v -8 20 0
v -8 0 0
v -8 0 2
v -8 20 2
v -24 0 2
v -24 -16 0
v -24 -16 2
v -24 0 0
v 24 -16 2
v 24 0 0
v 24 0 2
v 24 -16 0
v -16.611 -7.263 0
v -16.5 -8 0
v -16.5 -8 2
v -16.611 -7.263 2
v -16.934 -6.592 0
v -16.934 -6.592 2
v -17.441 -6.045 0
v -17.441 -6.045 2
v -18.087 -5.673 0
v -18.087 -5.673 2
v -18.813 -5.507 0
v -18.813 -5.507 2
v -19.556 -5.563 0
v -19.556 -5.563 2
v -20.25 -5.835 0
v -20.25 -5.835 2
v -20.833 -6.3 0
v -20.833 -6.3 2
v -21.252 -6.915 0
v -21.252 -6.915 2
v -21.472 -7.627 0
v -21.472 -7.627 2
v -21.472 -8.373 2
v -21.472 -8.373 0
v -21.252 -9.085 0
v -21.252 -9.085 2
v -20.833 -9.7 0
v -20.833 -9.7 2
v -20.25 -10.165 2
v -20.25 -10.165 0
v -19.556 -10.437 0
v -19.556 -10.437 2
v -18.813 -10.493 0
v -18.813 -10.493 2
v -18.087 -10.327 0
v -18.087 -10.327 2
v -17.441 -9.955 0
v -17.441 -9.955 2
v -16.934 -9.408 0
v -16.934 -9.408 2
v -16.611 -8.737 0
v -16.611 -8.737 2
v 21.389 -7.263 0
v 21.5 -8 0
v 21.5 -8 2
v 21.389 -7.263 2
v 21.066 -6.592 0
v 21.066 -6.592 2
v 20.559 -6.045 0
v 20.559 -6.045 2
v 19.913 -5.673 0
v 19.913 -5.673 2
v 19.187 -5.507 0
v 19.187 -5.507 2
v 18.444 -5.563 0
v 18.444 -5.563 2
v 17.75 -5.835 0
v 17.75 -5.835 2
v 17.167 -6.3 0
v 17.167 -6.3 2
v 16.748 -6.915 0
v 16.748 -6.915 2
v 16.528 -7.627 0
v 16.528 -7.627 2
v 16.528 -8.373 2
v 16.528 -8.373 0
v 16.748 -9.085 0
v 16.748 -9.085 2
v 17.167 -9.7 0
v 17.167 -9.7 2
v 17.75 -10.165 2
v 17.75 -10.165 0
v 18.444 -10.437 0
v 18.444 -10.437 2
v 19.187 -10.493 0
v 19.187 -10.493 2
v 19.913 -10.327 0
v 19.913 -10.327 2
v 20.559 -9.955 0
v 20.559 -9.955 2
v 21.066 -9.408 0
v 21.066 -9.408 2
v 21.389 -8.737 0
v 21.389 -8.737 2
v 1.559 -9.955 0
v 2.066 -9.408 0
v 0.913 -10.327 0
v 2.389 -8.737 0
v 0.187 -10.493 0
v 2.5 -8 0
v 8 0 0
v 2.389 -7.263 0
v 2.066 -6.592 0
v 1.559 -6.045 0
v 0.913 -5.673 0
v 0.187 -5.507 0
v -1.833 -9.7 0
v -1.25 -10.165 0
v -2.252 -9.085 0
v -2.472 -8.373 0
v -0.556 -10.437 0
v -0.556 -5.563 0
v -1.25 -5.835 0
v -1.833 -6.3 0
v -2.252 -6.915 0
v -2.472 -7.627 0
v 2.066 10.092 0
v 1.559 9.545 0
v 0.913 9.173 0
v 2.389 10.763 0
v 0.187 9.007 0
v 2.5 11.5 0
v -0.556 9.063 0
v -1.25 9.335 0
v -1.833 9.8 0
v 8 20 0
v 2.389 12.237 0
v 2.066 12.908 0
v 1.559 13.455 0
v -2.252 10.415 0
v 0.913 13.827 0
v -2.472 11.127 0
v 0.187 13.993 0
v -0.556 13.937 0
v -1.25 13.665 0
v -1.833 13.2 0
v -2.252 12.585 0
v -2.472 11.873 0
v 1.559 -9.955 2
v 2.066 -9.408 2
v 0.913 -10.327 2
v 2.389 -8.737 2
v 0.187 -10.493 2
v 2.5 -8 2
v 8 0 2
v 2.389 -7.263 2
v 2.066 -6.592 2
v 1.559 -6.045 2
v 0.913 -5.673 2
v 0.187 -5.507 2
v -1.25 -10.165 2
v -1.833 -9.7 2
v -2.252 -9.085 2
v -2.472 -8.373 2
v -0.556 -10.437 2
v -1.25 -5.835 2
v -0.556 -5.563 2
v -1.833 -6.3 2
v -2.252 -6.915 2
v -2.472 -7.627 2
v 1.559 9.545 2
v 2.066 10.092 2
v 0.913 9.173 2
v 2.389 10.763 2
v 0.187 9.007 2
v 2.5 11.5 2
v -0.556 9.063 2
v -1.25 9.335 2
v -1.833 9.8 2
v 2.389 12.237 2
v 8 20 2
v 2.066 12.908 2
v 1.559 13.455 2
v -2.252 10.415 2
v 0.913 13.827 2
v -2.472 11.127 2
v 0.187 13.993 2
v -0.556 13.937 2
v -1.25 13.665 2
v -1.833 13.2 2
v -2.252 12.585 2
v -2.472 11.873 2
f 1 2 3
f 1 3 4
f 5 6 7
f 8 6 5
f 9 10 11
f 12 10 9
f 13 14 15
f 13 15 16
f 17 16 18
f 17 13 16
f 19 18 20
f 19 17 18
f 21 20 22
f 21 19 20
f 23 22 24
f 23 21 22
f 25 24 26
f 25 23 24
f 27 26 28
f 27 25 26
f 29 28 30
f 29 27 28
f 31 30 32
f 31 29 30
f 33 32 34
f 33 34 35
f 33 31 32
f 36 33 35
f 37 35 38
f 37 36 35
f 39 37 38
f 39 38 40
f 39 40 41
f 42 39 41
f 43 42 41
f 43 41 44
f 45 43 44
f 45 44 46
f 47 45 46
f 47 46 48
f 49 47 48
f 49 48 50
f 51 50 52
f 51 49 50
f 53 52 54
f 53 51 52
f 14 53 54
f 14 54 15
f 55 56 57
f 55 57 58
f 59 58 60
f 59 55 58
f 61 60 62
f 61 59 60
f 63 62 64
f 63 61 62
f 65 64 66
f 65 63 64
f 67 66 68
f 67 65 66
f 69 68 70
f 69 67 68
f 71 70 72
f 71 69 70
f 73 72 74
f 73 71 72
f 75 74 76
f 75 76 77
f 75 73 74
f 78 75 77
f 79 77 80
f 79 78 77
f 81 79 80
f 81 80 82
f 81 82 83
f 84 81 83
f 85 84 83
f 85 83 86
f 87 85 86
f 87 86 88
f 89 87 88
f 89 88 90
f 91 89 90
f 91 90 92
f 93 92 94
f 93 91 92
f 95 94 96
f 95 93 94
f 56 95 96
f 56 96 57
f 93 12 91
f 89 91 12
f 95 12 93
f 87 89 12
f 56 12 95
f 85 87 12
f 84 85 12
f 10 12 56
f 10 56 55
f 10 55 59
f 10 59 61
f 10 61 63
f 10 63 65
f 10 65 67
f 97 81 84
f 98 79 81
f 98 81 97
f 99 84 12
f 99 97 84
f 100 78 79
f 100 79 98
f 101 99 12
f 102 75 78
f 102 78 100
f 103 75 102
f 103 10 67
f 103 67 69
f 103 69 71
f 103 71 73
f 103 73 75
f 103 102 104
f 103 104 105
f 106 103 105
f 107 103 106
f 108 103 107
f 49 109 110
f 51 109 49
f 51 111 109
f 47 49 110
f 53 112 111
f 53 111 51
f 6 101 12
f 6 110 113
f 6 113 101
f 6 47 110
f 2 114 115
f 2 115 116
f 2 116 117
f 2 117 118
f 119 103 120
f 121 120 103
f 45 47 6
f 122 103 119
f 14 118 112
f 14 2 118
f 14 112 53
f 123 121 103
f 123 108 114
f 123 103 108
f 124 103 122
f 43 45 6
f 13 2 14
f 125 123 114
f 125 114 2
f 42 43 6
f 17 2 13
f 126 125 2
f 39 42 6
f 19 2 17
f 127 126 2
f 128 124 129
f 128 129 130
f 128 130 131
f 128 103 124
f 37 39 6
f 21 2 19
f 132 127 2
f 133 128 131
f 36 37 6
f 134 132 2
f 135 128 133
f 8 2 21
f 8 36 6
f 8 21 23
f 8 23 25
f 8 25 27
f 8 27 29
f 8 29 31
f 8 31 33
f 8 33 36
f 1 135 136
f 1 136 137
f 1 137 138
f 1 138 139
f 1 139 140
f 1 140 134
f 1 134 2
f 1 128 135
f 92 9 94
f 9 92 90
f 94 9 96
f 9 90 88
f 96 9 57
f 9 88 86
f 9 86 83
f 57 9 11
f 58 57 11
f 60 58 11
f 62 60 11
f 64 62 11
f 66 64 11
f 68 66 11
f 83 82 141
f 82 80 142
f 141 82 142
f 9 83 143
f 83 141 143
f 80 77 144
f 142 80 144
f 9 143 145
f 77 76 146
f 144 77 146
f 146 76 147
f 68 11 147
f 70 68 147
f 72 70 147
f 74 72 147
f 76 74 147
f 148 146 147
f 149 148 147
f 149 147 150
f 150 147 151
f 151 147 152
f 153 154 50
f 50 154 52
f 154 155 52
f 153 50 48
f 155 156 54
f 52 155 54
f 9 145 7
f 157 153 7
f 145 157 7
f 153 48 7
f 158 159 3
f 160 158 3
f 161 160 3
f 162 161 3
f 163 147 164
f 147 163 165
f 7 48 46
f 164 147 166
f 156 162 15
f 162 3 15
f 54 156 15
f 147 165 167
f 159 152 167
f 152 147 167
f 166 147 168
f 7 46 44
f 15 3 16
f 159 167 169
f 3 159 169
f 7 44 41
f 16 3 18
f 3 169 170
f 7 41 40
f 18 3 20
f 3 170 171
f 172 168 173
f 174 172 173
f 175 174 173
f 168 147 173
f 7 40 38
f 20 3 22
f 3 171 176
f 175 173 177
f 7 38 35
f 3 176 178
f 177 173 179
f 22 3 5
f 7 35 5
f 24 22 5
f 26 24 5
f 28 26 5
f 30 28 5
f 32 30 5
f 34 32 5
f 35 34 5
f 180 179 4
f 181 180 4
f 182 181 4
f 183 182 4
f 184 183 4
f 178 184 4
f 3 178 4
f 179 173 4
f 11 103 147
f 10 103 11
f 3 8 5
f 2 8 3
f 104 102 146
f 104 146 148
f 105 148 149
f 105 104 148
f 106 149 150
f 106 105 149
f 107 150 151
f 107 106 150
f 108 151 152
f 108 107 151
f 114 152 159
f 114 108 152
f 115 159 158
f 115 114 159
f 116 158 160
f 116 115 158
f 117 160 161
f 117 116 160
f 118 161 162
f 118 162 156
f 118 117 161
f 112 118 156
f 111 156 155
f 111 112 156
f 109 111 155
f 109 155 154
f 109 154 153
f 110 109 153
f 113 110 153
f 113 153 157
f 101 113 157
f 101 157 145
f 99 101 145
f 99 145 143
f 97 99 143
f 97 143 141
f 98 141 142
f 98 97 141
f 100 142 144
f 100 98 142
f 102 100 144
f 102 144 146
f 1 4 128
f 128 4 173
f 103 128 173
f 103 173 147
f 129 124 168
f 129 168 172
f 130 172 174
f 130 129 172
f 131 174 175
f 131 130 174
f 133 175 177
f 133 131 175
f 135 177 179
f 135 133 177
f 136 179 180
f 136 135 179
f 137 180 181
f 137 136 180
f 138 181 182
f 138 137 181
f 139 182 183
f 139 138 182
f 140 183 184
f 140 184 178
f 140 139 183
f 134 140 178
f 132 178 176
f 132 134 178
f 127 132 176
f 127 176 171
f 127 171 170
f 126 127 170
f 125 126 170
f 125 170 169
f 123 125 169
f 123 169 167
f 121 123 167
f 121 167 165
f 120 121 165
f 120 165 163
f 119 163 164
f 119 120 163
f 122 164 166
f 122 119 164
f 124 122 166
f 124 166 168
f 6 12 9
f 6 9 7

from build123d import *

# Parameters (mm, degrees)
SKETCH2_R           = 2.5
EXTRUDE1_DEPTH      = 2
SKETCH_1_W          = 16
SKETCH_1_H          = 34
CUT_EXTRUDE_1_DEPTH = 60.126981996


with BuildPart() as part:
    # Sketch2 → Extrude1 (new body)
    with BuildSketch(Plane.XY):
        Polygon((-8, 0), (-8, 54), (8, 54), (8, 0), (24, 0), (24, -16), (-24, -16), (-24, 0), align=None)
        with Locations((19, -8)):
            Circle(SKETCH2_R, mode=Mode.SUBTRACT)
        with Locations((0, -8)):
            Circle(SKETCH2_R, mode=Mode.SUBTRACT)
        with Locations((-19, -8)):
            Circle(SKETCH2_R, mode=Mode.SUBTRACT)
        with Locations((0, 43.75)):
            Circle(SKETCH2_R, mode=Mode.SUBTRACT)
        with Locations((0, 11.5)):
            Circle(SKETCH2_R, mode=Mode.SUBTRACT)
    extrude(amount=EXTRUDE1_DEPTH)

    # Эскиз1 → Вырез-Вытянуть1 (cut, through all)
    with BuildSketch(Plane.XY.offset(2)):
        with Locations((0, 37)):
            Rectangle(SKETCH_1_W, SKETCH_1_H)
    extrude(amount=-CUT_EXTRUDE_1_DEPTH, mode=Mode.SUBTRACT)


solid = part.part
